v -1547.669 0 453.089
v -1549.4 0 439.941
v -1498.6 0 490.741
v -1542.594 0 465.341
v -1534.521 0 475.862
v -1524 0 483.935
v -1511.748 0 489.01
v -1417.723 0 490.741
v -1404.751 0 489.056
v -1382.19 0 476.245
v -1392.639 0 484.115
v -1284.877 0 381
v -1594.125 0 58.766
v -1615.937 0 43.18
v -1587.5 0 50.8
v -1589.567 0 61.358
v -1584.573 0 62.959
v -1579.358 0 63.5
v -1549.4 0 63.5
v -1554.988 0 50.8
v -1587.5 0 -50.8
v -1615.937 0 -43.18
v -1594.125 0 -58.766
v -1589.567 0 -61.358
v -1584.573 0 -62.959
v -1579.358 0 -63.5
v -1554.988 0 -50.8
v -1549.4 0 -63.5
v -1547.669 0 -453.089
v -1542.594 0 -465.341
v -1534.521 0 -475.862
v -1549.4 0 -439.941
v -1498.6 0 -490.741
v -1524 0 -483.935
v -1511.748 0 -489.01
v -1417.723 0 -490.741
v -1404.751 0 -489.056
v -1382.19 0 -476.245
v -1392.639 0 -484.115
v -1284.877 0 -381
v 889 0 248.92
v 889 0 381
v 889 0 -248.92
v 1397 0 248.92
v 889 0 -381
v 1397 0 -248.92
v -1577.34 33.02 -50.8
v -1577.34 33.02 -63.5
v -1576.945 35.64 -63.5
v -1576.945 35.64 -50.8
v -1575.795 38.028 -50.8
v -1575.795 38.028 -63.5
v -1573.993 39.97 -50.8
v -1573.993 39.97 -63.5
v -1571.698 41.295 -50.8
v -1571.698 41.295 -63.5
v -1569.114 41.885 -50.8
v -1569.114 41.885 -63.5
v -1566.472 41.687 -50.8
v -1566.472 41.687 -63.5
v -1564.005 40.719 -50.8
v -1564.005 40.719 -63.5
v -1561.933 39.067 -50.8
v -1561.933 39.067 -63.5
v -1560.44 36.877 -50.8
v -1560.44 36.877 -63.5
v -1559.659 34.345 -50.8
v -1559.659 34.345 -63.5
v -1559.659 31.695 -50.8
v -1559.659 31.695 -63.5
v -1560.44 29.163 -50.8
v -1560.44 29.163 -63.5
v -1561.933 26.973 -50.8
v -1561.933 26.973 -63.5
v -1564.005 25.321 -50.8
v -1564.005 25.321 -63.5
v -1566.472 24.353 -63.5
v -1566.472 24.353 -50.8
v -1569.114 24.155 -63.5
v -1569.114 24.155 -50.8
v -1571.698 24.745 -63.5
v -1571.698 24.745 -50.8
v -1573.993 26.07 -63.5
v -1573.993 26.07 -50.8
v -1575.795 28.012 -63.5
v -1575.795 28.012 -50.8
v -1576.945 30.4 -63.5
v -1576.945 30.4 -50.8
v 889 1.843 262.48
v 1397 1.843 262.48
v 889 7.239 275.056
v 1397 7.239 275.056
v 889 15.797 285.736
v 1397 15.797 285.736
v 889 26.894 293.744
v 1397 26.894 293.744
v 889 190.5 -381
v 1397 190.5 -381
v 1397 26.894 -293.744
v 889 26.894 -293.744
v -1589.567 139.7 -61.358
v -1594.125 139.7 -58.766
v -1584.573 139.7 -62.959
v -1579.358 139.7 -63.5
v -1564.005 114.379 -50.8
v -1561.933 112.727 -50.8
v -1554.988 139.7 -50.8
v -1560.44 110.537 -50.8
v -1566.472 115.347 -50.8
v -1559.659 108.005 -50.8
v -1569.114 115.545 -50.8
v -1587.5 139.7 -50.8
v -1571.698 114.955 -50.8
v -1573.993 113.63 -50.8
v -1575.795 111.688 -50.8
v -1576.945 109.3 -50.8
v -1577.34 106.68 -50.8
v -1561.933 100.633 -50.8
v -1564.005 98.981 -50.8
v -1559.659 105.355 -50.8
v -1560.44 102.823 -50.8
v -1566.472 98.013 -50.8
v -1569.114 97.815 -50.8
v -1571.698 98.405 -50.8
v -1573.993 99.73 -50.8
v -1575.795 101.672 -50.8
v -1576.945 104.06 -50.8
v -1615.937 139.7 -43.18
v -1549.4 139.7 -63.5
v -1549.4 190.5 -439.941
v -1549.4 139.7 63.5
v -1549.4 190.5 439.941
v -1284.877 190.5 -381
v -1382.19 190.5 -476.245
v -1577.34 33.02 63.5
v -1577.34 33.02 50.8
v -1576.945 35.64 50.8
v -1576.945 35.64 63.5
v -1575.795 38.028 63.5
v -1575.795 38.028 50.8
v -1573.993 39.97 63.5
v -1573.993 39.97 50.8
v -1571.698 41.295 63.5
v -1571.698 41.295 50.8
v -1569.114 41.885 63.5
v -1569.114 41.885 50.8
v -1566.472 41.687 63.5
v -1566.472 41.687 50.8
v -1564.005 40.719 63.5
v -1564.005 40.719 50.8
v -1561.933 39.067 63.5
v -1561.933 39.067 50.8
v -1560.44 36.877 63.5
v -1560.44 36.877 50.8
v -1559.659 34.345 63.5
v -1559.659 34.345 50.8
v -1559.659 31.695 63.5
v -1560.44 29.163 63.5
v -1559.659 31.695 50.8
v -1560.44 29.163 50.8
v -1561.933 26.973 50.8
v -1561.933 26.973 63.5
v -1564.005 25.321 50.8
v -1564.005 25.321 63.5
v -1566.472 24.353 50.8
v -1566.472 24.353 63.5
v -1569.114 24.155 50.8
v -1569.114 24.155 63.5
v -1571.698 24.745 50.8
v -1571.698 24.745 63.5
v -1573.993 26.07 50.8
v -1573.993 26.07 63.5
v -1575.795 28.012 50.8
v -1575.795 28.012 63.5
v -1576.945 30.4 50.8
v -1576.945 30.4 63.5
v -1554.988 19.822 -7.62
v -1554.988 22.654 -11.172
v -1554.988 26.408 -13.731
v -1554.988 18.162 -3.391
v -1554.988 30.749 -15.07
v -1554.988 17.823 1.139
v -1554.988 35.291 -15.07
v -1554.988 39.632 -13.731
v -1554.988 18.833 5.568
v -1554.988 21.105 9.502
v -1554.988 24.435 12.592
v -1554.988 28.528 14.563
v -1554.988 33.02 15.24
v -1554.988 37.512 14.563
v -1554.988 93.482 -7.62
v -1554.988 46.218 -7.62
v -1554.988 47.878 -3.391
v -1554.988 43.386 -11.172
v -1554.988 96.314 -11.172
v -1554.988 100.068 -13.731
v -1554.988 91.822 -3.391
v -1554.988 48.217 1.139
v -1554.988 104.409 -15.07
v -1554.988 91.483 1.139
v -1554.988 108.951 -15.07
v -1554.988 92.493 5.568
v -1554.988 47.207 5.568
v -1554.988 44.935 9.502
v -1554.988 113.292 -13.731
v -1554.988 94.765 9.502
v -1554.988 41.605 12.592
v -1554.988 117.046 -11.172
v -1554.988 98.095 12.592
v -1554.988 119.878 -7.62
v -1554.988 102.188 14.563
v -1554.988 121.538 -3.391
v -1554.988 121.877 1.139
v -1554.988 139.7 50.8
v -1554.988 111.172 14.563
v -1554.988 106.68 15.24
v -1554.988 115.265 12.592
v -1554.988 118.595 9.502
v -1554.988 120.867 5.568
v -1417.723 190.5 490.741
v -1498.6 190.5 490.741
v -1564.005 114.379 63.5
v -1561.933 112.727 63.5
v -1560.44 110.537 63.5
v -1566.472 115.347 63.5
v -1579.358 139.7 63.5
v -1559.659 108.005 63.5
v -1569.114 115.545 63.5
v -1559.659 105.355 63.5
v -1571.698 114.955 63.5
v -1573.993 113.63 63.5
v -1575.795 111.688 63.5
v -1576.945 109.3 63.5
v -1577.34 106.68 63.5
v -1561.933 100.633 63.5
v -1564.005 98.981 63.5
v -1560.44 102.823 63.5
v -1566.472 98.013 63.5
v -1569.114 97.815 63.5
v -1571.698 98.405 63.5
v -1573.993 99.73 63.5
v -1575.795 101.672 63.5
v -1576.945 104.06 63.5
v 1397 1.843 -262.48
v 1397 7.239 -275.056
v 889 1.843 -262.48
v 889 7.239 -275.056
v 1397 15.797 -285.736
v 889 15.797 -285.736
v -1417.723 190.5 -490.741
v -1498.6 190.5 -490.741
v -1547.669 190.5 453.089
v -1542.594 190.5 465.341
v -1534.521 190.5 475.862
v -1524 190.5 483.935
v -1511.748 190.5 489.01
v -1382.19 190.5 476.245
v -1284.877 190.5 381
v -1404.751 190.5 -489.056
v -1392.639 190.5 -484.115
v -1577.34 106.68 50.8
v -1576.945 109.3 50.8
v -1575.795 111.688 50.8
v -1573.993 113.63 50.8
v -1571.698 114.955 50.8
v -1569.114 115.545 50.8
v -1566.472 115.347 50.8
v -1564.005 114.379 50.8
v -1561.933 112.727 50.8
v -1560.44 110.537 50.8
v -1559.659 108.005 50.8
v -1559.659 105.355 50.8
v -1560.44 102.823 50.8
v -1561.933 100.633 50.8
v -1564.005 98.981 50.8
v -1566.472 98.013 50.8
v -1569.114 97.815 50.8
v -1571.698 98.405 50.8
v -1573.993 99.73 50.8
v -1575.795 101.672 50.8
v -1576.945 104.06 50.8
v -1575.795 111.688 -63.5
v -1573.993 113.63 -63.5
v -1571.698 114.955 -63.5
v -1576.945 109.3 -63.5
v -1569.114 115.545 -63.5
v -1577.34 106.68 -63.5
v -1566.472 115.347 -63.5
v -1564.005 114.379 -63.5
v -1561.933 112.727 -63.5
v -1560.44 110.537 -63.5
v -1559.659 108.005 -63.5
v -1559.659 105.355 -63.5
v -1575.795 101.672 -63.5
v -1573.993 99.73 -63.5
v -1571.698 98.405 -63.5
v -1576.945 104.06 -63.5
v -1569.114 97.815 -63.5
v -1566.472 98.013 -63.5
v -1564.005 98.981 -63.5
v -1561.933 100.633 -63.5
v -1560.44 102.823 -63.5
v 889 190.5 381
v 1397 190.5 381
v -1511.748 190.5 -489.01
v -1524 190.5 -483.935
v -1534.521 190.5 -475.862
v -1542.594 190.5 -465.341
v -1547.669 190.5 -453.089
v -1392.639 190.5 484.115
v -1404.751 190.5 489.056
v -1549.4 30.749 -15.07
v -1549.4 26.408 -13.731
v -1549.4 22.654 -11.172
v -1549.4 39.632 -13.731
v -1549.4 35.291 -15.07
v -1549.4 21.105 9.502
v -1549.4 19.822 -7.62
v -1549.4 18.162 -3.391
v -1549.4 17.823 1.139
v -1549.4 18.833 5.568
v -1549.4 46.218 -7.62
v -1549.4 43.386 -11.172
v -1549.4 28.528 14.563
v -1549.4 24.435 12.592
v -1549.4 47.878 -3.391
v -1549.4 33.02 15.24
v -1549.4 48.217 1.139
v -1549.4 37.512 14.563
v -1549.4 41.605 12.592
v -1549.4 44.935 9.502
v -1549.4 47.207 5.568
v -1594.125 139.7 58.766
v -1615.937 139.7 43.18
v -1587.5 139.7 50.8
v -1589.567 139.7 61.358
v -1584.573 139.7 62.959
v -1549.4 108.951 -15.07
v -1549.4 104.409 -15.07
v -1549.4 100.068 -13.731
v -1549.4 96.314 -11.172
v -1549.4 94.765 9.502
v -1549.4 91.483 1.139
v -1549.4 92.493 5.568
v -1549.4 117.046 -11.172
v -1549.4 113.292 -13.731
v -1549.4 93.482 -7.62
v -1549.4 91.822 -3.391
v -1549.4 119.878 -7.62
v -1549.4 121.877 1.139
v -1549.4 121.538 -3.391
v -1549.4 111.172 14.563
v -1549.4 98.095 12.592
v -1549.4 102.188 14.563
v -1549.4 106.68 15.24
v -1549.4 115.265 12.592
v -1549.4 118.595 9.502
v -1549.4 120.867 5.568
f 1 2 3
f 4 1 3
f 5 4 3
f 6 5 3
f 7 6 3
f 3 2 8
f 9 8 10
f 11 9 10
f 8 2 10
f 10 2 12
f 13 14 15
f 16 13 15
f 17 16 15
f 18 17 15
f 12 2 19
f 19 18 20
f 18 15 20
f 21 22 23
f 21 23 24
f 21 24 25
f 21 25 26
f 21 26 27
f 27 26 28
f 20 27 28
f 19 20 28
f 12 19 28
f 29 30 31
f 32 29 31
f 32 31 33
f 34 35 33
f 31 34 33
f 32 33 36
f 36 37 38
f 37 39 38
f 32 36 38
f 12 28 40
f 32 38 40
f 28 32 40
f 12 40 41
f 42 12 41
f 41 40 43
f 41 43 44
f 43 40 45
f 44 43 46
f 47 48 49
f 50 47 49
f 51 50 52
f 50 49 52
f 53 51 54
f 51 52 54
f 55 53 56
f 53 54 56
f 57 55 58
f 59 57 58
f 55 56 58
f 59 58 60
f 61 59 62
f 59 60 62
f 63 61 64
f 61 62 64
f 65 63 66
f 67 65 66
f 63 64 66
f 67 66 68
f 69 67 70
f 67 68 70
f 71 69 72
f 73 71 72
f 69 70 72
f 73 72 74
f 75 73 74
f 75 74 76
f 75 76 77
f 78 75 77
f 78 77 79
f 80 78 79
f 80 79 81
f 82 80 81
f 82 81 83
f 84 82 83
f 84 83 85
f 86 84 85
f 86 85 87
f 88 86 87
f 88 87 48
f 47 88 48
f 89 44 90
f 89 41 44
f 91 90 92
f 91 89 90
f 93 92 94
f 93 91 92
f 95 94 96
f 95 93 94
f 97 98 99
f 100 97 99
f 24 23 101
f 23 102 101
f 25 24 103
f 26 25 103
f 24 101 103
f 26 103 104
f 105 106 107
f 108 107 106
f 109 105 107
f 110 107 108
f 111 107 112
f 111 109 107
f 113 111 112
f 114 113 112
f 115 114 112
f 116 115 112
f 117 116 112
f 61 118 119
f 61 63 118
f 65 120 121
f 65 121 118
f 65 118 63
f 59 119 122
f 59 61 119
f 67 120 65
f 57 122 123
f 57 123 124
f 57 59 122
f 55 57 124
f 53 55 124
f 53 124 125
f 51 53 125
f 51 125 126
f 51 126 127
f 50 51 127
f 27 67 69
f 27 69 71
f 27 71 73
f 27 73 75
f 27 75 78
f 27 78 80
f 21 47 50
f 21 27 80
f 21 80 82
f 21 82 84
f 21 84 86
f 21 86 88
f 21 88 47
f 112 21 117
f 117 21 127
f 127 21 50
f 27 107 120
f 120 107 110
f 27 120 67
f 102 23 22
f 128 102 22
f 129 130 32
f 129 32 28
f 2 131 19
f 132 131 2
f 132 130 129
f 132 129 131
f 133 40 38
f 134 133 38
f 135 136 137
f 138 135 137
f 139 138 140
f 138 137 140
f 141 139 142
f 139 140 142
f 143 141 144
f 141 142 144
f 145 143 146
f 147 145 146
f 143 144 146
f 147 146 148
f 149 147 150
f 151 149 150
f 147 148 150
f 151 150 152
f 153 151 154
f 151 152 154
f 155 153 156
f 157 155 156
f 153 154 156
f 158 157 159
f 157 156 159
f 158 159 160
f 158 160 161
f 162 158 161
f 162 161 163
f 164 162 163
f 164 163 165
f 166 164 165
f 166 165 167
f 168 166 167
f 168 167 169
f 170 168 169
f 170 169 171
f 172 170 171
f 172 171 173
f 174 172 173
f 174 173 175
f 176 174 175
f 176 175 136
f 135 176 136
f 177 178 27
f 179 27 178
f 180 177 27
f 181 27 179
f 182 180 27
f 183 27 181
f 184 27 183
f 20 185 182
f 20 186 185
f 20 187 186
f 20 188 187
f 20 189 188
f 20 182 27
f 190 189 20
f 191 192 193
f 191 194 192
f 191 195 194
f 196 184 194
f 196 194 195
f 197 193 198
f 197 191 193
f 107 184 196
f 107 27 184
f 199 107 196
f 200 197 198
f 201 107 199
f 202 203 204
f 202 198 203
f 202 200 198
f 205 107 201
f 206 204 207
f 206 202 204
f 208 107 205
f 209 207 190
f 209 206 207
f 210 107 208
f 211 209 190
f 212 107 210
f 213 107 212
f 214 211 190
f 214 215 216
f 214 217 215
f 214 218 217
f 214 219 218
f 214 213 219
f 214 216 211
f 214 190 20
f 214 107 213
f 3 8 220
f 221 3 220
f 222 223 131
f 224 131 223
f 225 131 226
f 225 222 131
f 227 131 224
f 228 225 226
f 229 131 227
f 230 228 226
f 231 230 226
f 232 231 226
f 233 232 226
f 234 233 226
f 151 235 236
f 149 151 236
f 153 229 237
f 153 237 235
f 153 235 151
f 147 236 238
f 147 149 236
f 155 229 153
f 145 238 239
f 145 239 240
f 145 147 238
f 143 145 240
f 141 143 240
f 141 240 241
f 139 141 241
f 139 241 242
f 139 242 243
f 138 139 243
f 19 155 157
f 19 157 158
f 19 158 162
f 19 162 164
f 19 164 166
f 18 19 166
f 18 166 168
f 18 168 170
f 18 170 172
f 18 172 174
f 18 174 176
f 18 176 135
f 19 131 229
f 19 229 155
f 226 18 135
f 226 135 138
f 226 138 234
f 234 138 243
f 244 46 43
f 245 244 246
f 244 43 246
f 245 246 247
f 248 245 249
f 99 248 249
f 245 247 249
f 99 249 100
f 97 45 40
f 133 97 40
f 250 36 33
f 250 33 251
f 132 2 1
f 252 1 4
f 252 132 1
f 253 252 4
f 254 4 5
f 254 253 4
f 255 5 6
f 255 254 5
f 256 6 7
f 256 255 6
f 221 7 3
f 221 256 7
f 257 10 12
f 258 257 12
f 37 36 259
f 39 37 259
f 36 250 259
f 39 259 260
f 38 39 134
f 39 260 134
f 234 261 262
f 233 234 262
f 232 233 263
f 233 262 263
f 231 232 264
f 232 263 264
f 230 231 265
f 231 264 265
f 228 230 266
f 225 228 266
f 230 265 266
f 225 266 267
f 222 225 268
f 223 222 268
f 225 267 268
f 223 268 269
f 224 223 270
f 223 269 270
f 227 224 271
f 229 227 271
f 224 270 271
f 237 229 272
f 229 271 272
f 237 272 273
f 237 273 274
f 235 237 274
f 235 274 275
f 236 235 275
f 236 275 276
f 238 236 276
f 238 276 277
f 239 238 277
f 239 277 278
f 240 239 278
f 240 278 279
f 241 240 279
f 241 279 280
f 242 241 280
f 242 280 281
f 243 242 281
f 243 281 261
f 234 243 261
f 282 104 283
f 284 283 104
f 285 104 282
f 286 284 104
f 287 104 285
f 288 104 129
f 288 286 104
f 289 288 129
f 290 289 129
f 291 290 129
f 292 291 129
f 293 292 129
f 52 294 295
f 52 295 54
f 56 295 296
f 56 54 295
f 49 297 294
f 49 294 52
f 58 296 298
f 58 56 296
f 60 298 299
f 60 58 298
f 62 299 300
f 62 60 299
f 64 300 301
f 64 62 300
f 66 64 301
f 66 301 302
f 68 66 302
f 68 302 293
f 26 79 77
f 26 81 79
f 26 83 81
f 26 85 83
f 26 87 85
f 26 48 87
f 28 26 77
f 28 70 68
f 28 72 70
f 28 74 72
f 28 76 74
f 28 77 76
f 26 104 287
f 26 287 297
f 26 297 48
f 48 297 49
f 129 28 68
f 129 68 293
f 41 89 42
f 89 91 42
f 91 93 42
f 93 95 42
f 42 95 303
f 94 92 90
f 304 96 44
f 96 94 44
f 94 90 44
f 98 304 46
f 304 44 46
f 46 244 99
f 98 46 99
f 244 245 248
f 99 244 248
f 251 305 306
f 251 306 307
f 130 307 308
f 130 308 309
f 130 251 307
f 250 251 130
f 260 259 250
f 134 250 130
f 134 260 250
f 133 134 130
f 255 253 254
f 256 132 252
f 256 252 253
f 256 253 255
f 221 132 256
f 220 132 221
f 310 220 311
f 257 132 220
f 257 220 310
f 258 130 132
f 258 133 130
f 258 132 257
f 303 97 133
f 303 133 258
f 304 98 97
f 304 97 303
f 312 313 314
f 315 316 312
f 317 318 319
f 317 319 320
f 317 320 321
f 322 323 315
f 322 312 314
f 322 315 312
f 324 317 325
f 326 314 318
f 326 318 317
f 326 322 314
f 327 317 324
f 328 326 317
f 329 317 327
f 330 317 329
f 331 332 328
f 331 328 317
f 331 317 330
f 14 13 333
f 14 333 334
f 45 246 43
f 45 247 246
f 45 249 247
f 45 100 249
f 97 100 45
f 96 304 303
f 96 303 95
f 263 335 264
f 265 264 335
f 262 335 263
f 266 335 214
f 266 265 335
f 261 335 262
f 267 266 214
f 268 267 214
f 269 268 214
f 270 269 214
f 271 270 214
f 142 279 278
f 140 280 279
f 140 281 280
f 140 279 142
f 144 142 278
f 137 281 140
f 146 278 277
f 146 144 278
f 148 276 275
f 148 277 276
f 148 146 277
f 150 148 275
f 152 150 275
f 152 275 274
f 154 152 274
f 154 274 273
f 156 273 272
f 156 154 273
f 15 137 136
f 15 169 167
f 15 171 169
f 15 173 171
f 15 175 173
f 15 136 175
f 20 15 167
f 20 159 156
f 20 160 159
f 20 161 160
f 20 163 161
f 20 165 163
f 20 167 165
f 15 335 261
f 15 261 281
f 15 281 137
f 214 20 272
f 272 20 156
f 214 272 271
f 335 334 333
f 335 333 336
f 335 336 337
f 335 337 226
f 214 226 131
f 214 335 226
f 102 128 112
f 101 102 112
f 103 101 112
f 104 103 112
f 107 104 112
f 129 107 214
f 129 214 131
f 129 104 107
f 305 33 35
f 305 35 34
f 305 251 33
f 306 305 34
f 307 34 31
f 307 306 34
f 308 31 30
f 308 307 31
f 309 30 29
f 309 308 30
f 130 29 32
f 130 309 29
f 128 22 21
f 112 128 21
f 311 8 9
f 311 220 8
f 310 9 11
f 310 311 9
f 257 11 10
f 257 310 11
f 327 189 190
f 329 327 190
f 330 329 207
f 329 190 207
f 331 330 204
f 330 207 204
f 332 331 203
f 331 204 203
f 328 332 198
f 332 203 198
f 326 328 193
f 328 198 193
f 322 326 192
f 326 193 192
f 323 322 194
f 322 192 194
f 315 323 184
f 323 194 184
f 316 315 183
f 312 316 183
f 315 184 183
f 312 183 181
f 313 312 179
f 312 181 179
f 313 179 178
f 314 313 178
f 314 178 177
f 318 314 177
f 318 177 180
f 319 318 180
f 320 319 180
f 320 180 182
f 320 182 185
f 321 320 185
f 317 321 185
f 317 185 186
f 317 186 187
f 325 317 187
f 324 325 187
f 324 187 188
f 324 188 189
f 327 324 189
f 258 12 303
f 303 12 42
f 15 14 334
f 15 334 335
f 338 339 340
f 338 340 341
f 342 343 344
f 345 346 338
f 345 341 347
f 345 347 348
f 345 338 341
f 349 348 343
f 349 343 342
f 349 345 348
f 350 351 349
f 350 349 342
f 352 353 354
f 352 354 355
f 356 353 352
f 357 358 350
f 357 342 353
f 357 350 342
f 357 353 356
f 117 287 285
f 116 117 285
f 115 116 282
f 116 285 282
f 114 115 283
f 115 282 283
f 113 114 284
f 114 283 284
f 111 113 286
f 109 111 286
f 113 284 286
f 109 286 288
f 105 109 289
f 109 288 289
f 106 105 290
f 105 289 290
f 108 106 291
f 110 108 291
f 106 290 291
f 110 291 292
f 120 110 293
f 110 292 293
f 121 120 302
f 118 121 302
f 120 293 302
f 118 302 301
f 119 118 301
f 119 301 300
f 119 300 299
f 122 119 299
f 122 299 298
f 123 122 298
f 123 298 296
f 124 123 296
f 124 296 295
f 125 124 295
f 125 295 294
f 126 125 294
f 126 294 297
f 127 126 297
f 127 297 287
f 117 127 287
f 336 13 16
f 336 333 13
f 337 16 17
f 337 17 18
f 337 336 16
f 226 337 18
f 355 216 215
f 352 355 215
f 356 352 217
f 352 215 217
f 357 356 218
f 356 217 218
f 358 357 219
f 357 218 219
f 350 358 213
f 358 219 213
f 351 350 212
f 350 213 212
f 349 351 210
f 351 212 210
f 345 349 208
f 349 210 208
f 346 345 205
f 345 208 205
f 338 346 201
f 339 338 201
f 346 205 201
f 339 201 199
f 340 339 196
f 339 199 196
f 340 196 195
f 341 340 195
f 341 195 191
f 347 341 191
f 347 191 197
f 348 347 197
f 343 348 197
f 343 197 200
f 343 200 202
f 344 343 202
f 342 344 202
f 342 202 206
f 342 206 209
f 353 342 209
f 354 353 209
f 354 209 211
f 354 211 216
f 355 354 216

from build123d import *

# Parameters (mm, degrees)
BOSS_EXTRUDE1_DEPTH = 190.5
SKETCH3_W           = 981.481353614
SKETCH3_H           = 190.5
BOSS_EXTRUDE2_DEPTH = 152.4
FILLET2_R           = 50.8
CUT_EXTRUDE1_DEPTH  = 508
FILLET3_R           = 50.8
BOSS_EXTRUDE3_DEPTH = 139.7
BOSS_EXTRUDE4_START = -139.7
BOSS_EXTRUDE4_DEPTH = 139.7
SKETCH8_R           = 15.24
CUT_EXTRUDE2_DEPTH  = 12.7
SKETCH10_W          = 101.6
SKETCH10_H          = 139.7
CUT_EXTRUDE4_DEPTH  = 7.112
SKETCH9_R           = 8.89
CUT_EXTRUDE5_DEPTH  = 179.07
FILLET4_R           = 25.4


with BuildPart() as part:
    # Sketch1 → Boss-Extrude1 (new body)
    with BuildSketch(Plane(origin=(0, 0, 0), x_dir=(1, 0, 0), z_dir=(0, 1, 0))):
        Polygon((-1284.876827817, -381), (1397, -381), (1397, 381), (-1284.876827817, 381), (-1397, 490.740676807), (-1397, -490.740676807), align=None)
    extrude(amount=BOSS_EXTRUDE1_DEPTH)

    # Sketch3 → Boss-Extrude2 (add)
    with BuildSketch(Plane.ZY.offset(1397)):
        with Locations((0, 95.25)):
            Rectangle(SKETCH3_W, SKETCH3_H)
    extrude(amount=BOSS_EXTRUDE2_DEPTH)

    # Fillet2
    fillet2_edges = [part.edges().sort_by_distance(p)[0] for p in [
        (-1397, 95.25, 490.740676807),
        (-1397, 95.25, -490.740676807),
        (-1549.4, 95.25, -490.740676807),
        (-1549.4, 95.25, 490.740676807),
    ]]
    fillet(fillet2_edges, radius=FILLET2_R)

    # Sketch4 → Cut-Extrude1 (cut)
    with BuildSketch(Plane(origin=(1397, 0, 0), x_dir=(0, 0, -1), z_dir=(1, 0, 0))):
        Polygon((-381, 190.5), (-279.4, 0), (-381, 0), align=None)
        Polygon((381, 190.5), (279.4, 0), (381, 0), align=None)
    extrude(amount=-CUT_EXTRUDE1_DEPTH, mode=Mode.SUBTRACT)

    # Fillet3
    fillet3_edges = [part.edges().sort_by_distance(p)[0] for p in [
        (1143, 0, 279.4),
        (1143, 0, -279.4),
    ]]
    fillet(fillet3_edges, radius=FILLET3_R)

    # Sketch6 → Boss-Extrude3 (add)
    with BuildSketch(Plane.XZ):
        Polygon((-1562.1, 50.8), (-1562.1, -50.8), (-1587.5, -50.8), (-1587.5, -63.5), (-1549.4, -63.5), (-1549.4, 63.5), (-1587.5, 63.5), (-1587.5, 50.8), align=None)
    extrude(amount=-BOSS_EXTRUDE3_DEPTH)

    # Sketch7 → Boss-Extrude4 (add)
    with BuildSketch(Plane(origin=(0, 139.7, 0), x_dir=(1, 0, 0), z_dir=(0, 1, 0)).offset(BOSS_EXTRUDE4_START)):
        Polygon((-1587.5, 63.5), (-1615.936596207, 43.180437011), (-1587.5, 50.8), align=None)
        Polygon((-1615.936596207, -43.180437011), (-1587.5, -50.8), (-1587.5, -63.5), align=None)
    extrude(amount=BOSS_EXTRUDE4_DEPTH)

    # Sketch8 → Cut-Extrude2 (cut)
    with BuildSketch(Plane.ZY.offset(1562.1)):
        with Locations((0, 106.68)):
            Circle(SKETCH8_R)
        with Locations((0, 33.02)):
            Circle(SKETCH8_R)
    extrude(amount=-CUT_EXTRUDE2_DEPTH, mode=Mode.SUBTRACT)

    # Sketch10 → Cut-Extrude4 (cut)
    with BuildSketch(Plane.ZY.offset(1562.1)):
        with Locations((0, 69.85)):
            Rectangle(SKETCH10_W, SKETCH10_H)
    extrude(amount=-CUT_EXTRUDE4_DEPTH, mode=Mode.SUBTRACT)

    # Sketch9 → Cut-Extrude5 (cut)
    with BuildSketch(Plane(origin=(0, 0, -63.5), x_dir=(-1, 0, 0), z_dir=(0, 0, -1))):
        with Locations((1568.45, 106.68)):
            Circle(SKETCH9_R)
        with Locations((1568.45, 33.02)):
            Circle(SKETCH9_R)
    extrude(amount=-CUT_EXTRUDE5_DEPTH, mode=Mode.SUBTRACT)

    # Fillet4
    fillet4_edges = [part.edges().sort_by_distance(p)[0] for p in [
        (-1587.5, 69.85, -63.5),
        (-1587.5, 69.85, 63.5),
    ]]
    fillet(fillet4_edges, radius=FILLET4_R)


solid = part.part
